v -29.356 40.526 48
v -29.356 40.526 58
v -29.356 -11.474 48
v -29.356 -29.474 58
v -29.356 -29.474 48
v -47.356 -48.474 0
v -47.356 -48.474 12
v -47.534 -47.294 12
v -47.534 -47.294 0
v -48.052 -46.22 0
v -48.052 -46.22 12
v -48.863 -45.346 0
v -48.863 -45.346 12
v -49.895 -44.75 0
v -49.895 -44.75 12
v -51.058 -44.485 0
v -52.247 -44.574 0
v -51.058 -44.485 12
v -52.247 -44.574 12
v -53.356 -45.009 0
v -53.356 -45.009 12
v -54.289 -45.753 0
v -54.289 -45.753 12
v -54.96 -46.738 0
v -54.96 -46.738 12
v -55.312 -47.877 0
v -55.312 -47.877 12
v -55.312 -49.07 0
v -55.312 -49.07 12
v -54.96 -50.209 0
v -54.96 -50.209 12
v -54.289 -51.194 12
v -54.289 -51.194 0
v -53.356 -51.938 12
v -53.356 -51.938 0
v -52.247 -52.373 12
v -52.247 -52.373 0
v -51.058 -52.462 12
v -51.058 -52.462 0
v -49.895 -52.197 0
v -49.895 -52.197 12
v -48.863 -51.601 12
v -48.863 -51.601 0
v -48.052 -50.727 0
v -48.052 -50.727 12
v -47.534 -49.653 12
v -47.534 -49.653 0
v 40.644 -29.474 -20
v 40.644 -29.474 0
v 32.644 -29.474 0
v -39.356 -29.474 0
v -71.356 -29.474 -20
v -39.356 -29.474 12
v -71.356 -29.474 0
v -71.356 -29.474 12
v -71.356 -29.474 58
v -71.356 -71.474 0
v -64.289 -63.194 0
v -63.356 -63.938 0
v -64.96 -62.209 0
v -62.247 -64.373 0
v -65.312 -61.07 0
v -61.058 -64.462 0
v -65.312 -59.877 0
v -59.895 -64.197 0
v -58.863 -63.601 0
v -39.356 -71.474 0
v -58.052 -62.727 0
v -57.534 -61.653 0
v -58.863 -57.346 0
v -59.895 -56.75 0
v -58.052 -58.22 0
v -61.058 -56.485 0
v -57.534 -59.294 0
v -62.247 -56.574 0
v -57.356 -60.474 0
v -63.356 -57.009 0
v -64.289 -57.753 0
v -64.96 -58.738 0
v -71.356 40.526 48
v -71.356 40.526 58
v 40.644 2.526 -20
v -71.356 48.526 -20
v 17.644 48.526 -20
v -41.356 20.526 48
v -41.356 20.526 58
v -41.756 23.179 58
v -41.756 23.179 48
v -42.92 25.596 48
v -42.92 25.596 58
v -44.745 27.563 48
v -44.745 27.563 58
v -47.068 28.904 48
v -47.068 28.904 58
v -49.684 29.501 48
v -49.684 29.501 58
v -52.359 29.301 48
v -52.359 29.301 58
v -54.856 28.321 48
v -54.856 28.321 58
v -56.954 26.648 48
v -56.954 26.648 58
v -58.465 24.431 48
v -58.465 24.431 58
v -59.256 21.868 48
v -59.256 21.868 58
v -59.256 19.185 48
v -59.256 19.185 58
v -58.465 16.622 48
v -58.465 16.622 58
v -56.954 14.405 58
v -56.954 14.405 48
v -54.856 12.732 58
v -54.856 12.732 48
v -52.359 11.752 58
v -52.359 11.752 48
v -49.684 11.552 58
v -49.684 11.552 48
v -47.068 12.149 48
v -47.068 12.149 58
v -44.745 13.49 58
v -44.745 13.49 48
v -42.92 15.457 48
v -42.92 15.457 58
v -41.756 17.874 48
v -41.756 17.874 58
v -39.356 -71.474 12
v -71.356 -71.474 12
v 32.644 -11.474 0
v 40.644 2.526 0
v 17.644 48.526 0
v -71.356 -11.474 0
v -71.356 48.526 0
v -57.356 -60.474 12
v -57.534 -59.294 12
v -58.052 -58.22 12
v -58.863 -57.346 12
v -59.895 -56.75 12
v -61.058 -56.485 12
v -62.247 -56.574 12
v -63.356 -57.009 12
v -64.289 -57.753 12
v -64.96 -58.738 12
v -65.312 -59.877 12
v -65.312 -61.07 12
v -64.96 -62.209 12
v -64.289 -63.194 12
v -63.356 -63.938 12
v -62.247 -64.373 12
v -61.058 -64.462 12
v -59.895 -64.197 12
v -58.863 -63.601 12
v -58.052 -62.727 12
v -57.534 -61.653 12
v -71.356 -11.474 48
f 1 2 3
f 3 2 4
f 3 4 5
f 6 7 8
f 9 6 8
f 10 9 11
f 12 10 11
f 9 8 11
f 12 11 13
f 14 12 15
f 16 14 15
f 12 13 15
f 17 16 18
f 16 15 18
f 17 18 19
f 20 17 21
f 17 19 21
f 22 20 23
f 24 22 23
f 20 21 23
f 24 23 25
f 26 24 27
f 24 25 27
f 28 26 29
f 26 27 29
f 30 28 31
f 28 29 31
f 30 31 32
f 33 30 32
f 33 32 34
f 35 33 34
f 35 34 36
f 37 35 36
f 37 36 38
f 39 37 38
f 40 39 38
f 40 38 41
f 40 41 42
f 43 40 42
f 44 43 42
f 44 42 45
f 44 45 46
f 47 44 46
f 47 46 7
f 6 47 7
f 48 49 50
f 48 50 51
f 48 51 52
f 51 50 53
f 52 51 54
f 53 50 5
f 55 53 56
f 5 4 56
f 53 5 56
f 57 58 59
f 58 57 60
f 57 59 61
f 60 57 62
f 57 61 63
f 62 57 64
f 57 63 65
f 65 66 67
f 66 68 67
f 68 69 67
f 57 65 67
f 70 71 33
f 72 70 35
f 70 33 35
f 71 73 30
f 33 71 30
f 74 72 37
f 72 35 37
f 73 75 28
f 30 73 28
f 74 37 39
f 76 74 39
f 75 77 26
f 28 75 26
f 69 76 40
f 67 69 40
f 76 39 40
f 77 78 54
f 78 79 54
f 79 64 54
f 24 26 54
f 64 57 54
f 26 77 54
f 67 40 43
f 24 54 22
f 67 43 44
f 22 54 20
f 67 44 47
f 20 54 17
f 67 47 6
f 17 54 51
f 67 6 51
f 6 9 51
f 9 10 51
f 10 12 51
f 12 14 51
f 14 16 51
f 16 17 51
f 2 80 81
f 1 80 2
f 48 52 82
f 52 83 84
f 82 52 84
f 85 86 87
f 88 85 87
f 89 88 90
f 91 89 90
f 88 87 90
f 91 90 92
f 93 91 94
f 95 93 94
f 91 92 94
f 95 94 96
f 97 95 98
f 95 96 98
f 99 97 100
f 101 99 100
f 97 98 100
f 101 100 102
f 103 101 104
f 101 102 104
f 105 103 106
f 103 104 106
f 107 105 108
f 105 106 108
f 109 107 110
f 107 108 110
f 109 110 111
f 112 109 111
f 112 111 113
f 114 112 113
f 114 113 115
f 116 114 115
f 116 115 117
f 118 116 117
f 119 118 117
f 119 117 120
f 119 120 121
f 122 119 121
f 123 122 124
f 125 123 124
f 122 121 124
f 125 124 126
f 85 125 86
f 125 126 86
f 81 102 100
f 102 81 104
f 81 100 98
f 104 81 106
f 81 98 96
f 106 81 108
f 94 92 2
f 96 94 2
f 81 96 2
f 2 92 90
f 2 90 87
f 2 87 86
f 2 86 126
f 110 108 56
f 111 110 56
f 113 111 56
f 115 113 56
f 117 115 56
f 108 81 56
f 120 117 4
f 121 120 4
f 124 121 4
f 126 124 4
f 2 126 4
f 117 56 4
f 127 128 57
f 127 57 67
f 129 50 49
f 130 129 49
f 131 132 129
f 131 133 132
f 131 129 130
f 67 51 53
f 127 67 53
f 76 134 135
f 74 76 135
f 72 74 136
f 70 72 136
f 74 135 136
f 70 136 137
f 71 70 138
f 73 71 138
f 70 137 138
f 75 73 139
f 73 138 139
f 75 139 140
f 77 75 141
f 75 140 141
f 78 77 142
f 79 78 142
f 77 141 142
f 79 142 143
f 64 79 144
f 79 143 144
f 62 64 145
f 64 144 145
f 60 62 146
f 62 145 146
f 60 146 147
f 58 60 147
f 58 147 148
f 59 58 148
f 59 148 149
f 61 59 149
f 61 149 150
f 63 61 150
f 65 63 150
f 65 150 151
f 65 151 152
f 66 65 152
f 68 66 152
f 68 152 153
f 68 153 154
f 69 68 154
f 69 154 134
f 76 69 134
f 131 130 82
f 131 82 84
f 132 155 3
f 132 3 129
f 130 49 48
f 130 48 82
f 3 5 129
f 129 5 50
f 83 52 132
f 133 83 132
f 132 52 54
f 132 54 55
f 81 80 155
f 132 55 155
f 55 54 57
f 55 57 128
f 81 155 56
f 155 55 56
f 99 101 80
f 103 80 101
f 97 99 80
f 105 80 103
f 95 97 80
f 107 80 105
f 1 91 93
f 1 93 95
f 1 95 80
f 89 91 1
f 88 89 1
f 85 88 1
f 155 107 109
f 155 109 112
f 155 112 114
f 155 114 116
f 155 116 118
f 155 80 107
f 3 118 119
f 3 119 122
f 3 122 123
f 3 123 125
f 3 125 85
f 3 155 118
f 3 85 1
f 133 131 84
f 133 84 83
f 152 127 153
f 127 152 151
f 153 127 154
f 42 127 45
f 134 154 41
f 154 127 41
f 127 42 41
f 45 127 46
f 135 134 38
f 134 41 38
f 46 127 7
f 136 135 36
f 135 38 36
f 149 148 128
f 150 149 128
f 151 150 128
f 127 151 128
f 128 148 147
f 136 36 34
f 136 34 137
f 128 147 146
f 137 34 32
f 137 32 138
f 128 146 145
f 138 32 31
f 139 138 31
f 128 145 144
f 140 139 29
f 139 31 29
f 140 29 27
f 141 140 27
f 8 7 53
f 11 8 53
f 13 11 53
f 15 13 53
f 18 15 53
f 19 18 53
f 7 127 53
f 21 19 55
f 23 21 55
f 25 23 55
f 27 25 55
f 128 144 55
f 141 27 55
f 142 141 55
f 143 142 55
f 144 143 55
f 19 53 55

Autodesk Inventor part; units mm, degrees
ref_plane "YZ Plane" through (0, 0, 0) normal (1, 0, 0) x (0, 1, 0)
ref_plane "XZ Plane" through (0, 0, 0) normal (0, 1, 0) x (-1, 0, 0)
ref_plane "XY Plane" through (0, 0, 0) normal (0, 0, 1) x (1, 0, 0)
sketch "Sketch1" plane through (0, 0, 0) normal (0, 0, 1) x (1, 0, 0)
  line L0 (40.6435, -29.4735) -> (-71.3565, -29.4735)
  line L1 (-71.3565, -29.4735) -> (-71.3565, 48.5265)
  line L2 (40.6435, -29.4735) -> (40.6435, 2.5265)
  line L3 (40.6435, 2.5265) -> (17.6435, 48.5265)
  line L4 (17.6435, 48.5265) -> (-71.3565, 48.5265)
  point P0 (0, 0)
  point P1 (40.6435, 100.5706)
  dimension "d0" = 112
  dimension "d1" = 78
  dimension "d5" = 32
  dimension "d8" = 23
extrude "Extrusion1" add sketch "Sketch1" against normal blind 20
sketch "Sketch2" plane through (0, 0, 0) normal (0, 0, 1) x (1, 0, 0)
  point P0 (0, 0)
ref_plane "Work Plane1" through (-71.3565, -29.4735, 0) normal (0, -1, 0) x (1, 0, 0)
sketch "Sketch3" plane through (-71.3565, -29.4735, 0) normal (0, -1, 0) x (1, 0, 0)
  line L0 (0, 0) -> (0, 58)
  line L1 (0, 58) -> (42, 58)
  line L2 (42, 58) -> (42, 48)
  line L3 (42, 48) -> (104, 0)
  line L4 (112, 0) -> (89, 0) projected
  line L5 (0, 0) -> (104, 0)
  point P0 (71.3565, 0)
  dimension "d12" = 8
  dimension "d13" = 10
  dimension "d14" = 58
  dimension "d21" = 42
extrude "Extrusion2" add sketch "Sketch3" against normal blind 18
sketch "Sketch4" plane through (-71.3565, -29.4735, 0) normal (0, -1, 0) x (1, 0, 0)
  line L0 (0, 0) -> (0, 58) projected
  line L1 (0, 0) -> (32, 0)
  line L2 (32, 0) -> (32, 12)
  line L3 (32, 12) -> (0, 12)
  line L4 (0, 12) -> (0, 0)
  point P0 (71.3565, 0)
  point P1 (0, 12)
  dimension "d17" = 12
  dimension "d18" = 32
extrude "Extrusion3" add sketch "Sketch4" along normal blind 42
sketch "Sketch5" plane through (-71.3565, -11.4735, 0) normal (0, 1, 0) x (1, 0, 0)
  point P0 (71.3565, 0)
sketch "Sketch6" plane through (-71.3565, -11.4735, 0) normal (0, 1, 0) x (1, 0, 0)
  line L0 (42, -48) -> (104, 0) projected
  line L1 (0, -58) -> (42, -58) projected
  line L2 (0, -58) -> (42, -58) projected
  line L3 (42, -58) -> (42, -48) projected
  line L4 (42, -48) -> (104, 0) projected
  line L5 (0, 0) -> (104, 0) projected
  line L6 (0, 0) -> (0, -58) projected
  line L7 (0, 0) -> (0, -58) projected
  line L8 (42, -58) -> (42, -48) projected
  line L9 (0, -58) -> (0, -12) projected
  line L10 (42, -58) -> (0, -58)
  line L11 (0, -58) -> (0, -48)
  line L12 (0, -48) -> (42, -48)
  line L13 (42, -48) -> (42, -58)
  point P0 (71.3565, 0)
extrude "Extrusion4" add sketch "Sketch6" along normal blind 52 contours L3 L1 L6 L12
sketch "Sketch7" plane through (-71.3565, -29.4735, 12) normal (0, 0, 1) x (1, 0, 0)
  line L0 (0, 0) -> (0, -42) projected
  circle A0 centre (10, -31) radius 4
  circle A1 centre (20, -19) radius 4
  point P0 (71.3565, 29.4735)
  point P1 (10, -42)
  point P2 (0, -31)
  point P3 (20, -42)
  point P4 (0, -19)
  dimension "d24" = 10
  dimension "d25" = 11
  dimension "d26" = 8
  dimension "d27" = 20
  dimension "d28" = 23
  dimension "d29" = 8
extrude "Extrusion5" cut sketch "Sketch7" against normal blind 52
sketch "Sketch8" plane through (-71.3565, -29.4735, 58) normal (0, 0, 1) x (1, 0, 0)
  line L0 (42, 0) -> (0, 0) projected
  line L1 (42, 0) -> (42, 70) projected
  line L2 (0, 70) -> (42, 70) projected
  line L3 (0, 0) -> (0, 70) projected
  line L4 (0, 70) -> (42, 70) projected
  circle A0 centre (21, 50) radius 9
  point P0 (71.3565, 29.4735)
  point P1 (0, 50)
  point P2 (21, 70)
  point P3 (21, 70)
  dimension "d32" = 21
  dimension "d33" = 20
  dimension "d34" = 18
extrude "Extrusion6" cut sketch "Sketch8" against normal blind 20 contours A0
